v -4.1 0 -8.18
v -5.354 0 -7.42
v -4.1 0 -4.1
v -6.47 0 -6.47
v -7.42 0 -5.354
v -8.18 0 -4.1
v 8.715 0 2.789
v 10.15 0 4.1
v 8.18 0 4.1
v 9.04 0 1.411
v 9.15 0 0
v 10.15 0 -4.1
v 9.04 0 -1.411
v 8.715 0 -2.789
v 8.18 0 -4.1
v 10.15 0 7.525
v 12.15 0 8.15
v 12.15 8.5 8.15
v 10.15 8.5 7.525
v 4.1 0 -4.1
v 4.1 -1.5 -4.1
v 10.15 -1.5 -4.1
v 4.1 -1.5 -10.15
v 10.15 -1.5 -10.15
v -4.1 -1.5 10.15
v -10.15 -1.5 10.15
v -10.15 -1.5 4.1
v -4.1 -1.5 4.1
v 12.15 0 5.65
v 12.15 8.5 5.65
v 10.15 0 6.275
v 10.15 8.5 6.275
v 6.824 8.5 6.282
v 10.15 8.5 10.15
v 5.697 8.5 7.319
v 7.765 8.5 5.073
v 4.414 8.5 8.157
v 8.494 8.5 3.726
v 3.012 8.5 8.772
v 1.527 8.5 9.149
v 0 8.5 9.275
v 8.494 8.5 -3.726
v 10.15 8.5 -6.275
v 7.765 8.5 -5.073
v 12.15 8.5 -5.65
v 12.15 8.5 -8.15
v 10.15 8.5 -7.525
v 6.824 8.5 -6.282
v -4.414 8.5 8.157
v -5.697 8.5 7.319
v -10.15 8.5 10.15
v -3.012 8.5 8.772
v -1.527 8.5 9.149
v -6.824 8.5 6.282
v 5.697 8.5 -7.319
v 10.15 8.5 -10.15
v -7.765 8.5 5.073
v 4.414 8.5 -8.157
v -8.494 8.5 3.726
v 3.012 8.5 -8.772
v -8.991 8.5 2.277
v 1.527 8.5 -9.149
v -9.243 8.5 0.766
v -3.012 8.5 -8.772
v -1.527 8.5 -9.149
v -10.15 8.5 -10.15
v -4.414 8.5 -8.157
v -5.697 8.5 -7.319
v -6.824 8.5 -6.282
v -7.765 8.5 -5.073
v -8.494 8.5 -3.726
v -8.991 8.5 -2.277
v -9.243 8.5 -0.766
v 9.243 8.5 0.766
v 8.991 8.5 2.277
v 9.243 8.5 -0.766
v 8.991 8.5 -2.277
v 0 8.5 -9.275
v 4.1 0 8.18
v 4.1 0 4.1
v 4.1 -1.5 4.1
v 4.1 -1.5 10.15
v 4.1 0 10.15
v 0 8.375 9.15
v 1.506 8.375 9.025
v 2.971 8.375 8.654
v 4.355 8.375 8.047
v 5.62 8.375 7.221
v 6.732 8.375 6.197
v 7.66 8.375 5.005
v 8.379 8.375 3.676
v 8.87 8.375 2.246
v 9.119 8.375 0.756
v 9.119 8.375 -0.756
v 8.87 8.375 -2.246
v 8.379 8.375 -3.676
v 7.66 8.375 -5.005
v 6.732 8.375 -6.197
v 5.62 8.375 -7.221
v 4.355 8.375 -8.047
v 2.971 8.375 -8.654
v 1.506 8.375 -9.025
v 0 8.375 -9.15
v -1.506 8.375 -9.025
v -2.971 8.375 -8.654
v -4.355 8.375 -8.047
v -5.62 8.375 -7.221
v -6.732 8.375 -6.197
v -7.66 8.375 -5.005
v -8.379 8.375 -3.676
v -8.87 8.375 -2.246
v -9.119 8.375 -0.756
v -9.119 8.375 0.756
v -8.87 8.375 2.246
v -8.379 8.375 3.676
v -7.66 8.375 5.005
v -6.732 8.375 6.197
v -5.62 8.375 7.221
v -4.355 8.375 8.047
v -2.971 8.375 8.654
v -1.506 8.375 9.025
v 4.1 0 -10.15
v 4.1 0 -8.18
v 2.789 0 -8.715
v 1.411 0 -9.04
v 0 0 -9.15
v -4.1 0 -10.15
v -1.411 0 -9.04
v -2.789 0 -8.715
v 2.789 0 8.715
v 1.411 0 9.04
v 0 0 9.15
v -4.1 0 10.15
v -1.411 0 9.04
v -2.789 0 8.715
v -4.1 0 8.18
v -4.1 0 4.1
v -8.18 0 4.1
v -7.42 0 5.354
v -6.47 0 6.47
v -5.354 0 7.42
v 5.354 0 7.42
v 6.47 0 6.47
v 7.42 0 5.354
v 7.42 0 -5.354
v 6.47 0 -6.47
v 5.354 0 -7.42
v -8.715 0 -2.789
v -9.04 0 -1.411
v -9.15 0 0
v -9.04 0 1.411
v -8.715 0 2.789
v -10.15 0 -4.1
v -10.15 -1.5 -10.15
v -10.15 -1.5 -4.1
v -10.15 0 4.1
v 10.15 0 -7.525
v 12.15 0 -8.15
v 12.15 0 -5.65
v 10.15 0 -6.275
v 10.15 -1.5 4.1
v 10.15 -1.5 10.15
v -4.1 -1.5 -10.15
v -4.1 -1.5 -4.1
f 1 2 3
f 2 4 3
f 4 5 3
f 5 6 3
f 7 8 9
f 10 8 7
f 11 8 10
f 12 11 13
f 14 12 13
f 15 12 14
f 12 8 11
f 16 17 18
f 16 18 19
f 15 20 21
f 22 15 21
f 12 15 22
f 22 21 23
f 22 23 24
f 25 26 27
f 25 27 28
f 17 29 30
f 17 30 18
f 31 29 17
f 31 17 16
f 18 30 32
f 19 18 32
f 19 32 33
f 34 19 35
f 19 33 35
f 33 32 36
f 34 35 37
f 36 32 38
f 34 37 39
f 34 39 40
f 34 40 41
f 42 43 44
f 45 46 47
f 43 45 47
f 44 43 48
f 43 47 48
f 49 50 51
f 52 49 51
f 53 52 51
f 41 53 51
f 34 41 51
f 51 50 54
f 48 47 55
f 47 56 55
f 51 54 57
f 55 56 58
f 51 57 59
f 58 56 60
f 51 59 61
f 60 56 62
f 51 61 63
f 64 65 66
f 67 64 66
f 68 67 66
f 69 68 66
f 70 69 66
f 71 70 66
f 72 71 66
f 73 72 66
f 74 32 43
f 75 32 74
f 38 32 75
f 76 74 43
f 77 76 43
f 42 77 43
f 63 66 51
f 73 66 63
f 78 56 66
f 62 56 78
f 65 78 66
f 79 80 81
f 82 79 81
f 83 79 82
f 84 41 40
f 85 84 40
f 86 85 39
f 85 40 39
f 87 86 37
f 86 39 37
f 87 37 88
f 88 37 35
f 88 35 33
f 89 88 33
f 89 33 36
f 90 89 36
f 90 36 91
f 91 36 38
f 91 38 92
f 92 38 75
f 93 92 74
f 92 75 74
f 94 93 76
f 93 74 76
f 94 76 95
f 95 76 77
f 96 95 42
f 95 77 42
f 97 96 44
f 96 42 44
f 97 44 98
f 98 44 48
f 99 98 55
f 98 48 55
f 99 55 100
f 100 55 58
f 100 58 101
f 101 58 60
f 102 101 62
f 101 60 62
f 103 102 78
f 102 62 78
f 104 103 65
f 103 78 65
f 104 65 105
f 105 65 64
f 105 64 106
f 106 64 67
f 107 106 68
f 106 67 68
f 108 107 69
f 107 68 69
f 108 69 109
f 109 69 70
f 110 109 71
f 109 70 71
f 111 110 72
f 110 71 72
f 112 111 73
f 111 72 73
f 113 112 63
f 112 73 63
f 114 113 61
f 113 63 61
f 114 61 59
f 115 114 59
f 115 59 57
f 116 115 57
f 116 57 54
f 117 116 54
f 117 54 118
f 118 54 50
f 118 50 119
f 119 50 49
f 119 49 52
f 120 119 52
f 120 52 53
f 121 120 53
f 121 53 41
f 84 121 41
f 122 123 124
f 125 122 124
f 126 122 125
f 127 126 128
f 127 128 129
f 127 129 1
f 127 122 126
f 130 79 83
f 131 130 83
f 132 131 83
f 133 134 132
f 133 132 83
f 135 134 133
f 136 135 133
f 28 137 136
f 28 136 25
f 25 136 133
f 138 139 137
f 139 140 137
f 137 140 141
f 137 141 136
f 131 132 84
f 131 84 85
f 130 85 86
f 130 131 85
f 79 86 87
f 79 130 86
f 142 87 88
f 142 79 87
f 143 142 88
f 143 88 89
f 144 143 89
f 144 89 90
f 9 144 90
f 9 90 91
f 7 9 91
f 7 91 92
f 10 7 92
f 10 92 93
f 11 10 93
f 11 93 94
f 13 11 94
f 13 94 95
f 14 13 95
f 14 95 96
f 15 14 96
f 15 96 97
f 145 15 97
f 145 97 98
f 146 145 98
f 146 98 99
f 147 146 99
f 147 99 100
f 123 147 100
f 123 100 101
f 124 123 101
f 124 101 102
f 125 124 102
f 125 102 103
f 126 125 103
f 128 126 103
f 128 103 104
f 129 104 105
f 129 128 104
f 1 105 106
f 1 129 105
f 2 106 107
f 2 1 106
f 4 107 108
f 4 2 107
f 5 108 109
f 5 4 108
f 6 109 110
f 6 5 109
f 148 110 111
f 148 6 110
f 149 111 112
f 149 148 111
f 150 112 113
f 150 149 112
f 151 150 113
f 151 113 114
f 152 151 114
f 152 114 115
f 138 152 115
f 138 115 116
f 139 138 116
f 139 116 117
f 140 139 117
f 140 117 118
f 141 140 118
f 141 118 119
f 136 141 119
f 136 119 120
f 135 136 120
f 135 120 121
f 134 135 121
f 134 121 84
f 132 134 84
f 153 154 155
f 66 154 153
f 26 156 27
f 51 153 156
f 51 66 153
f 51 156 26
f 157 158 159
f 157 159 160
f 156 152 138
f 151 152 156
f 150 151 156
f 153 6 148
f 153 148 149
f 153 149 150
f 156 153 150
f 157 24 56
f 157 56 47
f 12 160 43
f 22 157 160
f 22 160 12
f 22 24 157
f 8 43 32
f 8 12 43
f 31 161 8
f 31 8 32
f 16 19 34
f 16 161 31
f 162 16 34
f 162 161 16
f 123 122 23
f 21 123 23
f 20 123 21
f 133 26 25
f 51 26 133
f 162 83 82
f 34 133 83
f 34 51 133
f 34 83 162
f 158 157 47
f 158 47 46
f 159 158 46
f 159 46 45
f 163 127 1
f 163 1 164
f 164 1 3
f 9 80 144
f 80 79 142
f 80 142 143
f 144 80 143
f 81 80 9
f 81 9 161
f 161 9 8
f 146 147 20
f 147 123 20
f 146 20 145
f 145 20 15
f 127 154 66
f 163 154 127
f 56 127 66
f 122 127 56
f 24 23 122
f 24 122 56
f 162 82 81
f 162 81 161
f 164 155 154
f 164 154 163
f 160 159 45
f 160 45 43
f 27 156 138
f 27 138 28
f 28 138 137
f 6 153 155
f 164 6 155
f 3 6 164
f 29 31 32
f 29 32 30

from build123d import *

# Parameters (mm, degrees)
SKETCH1_R              = 9.15
CELL_HOLDER_DEPTH      = 8.5
SKETCH2_W              = 6.05
SKETCH2_H              = 6.05
BOTTOM_BASE_BOSS_DEPTH = 1.5
CHAMFER1_SIZE          = 0.125


with BuildPart() as part:
    # Sketch1 → Cell Holder (new body)
    with BuildSketch(Plane(origin=(0, 0, 0), x_dir=(1, 0, 0), z_dir=(0, 1, 0))):
        Polygon((12.15, 8.15), (12.15, 5.65), (10.15, 6.275), (10.15, -6.275), (12.15, -5.65), (12.15, -8.15), (10.15, -7.525), (10.15, -10.15), (-10.15, -10.15), (-10.15, 10.15), (10.15, 10.15), (10.15, 7.525), align=None)
        with Locations(Location((0, 0, 0), (0, 0, 270))):
            Circle(SKETCH1_R, mode=Mode.SUBTRACT)
    extrude(amount=CELL_HOLDER_DEPTH)

    # Sketch2 → Bottom Base Boss (add)
    with BuildSketch(Plane.XZ):
        with Locations((-7.125, 7.125)):
            Rectangle(SKETCH2_W, SKETCH2_H)
        with Locations((-7.125, -7.125)):
            Rectangle(SKETCH2_W, SKETCH2_H)
        with Locations((7.125, 7.125)):
            Rectangle(SKETCH2_W, SKETCH2_H)
        with Locations((7.125, -7.125)):
            Rectangle(SKETCH2_W, SKETCH2_H)
    extrude(amount=BOTTOM_BASE_BOSS_DEPTH)

    # Chamfer1
    chamfer1_edges = [part.edges().sort_by_distance(p)[0] for p in [
        (0, 8.5, -9.15),
    ]]
    chamfer(chamfer1_edges, length=CHAMFER1_SIZE)


solid = part.part
